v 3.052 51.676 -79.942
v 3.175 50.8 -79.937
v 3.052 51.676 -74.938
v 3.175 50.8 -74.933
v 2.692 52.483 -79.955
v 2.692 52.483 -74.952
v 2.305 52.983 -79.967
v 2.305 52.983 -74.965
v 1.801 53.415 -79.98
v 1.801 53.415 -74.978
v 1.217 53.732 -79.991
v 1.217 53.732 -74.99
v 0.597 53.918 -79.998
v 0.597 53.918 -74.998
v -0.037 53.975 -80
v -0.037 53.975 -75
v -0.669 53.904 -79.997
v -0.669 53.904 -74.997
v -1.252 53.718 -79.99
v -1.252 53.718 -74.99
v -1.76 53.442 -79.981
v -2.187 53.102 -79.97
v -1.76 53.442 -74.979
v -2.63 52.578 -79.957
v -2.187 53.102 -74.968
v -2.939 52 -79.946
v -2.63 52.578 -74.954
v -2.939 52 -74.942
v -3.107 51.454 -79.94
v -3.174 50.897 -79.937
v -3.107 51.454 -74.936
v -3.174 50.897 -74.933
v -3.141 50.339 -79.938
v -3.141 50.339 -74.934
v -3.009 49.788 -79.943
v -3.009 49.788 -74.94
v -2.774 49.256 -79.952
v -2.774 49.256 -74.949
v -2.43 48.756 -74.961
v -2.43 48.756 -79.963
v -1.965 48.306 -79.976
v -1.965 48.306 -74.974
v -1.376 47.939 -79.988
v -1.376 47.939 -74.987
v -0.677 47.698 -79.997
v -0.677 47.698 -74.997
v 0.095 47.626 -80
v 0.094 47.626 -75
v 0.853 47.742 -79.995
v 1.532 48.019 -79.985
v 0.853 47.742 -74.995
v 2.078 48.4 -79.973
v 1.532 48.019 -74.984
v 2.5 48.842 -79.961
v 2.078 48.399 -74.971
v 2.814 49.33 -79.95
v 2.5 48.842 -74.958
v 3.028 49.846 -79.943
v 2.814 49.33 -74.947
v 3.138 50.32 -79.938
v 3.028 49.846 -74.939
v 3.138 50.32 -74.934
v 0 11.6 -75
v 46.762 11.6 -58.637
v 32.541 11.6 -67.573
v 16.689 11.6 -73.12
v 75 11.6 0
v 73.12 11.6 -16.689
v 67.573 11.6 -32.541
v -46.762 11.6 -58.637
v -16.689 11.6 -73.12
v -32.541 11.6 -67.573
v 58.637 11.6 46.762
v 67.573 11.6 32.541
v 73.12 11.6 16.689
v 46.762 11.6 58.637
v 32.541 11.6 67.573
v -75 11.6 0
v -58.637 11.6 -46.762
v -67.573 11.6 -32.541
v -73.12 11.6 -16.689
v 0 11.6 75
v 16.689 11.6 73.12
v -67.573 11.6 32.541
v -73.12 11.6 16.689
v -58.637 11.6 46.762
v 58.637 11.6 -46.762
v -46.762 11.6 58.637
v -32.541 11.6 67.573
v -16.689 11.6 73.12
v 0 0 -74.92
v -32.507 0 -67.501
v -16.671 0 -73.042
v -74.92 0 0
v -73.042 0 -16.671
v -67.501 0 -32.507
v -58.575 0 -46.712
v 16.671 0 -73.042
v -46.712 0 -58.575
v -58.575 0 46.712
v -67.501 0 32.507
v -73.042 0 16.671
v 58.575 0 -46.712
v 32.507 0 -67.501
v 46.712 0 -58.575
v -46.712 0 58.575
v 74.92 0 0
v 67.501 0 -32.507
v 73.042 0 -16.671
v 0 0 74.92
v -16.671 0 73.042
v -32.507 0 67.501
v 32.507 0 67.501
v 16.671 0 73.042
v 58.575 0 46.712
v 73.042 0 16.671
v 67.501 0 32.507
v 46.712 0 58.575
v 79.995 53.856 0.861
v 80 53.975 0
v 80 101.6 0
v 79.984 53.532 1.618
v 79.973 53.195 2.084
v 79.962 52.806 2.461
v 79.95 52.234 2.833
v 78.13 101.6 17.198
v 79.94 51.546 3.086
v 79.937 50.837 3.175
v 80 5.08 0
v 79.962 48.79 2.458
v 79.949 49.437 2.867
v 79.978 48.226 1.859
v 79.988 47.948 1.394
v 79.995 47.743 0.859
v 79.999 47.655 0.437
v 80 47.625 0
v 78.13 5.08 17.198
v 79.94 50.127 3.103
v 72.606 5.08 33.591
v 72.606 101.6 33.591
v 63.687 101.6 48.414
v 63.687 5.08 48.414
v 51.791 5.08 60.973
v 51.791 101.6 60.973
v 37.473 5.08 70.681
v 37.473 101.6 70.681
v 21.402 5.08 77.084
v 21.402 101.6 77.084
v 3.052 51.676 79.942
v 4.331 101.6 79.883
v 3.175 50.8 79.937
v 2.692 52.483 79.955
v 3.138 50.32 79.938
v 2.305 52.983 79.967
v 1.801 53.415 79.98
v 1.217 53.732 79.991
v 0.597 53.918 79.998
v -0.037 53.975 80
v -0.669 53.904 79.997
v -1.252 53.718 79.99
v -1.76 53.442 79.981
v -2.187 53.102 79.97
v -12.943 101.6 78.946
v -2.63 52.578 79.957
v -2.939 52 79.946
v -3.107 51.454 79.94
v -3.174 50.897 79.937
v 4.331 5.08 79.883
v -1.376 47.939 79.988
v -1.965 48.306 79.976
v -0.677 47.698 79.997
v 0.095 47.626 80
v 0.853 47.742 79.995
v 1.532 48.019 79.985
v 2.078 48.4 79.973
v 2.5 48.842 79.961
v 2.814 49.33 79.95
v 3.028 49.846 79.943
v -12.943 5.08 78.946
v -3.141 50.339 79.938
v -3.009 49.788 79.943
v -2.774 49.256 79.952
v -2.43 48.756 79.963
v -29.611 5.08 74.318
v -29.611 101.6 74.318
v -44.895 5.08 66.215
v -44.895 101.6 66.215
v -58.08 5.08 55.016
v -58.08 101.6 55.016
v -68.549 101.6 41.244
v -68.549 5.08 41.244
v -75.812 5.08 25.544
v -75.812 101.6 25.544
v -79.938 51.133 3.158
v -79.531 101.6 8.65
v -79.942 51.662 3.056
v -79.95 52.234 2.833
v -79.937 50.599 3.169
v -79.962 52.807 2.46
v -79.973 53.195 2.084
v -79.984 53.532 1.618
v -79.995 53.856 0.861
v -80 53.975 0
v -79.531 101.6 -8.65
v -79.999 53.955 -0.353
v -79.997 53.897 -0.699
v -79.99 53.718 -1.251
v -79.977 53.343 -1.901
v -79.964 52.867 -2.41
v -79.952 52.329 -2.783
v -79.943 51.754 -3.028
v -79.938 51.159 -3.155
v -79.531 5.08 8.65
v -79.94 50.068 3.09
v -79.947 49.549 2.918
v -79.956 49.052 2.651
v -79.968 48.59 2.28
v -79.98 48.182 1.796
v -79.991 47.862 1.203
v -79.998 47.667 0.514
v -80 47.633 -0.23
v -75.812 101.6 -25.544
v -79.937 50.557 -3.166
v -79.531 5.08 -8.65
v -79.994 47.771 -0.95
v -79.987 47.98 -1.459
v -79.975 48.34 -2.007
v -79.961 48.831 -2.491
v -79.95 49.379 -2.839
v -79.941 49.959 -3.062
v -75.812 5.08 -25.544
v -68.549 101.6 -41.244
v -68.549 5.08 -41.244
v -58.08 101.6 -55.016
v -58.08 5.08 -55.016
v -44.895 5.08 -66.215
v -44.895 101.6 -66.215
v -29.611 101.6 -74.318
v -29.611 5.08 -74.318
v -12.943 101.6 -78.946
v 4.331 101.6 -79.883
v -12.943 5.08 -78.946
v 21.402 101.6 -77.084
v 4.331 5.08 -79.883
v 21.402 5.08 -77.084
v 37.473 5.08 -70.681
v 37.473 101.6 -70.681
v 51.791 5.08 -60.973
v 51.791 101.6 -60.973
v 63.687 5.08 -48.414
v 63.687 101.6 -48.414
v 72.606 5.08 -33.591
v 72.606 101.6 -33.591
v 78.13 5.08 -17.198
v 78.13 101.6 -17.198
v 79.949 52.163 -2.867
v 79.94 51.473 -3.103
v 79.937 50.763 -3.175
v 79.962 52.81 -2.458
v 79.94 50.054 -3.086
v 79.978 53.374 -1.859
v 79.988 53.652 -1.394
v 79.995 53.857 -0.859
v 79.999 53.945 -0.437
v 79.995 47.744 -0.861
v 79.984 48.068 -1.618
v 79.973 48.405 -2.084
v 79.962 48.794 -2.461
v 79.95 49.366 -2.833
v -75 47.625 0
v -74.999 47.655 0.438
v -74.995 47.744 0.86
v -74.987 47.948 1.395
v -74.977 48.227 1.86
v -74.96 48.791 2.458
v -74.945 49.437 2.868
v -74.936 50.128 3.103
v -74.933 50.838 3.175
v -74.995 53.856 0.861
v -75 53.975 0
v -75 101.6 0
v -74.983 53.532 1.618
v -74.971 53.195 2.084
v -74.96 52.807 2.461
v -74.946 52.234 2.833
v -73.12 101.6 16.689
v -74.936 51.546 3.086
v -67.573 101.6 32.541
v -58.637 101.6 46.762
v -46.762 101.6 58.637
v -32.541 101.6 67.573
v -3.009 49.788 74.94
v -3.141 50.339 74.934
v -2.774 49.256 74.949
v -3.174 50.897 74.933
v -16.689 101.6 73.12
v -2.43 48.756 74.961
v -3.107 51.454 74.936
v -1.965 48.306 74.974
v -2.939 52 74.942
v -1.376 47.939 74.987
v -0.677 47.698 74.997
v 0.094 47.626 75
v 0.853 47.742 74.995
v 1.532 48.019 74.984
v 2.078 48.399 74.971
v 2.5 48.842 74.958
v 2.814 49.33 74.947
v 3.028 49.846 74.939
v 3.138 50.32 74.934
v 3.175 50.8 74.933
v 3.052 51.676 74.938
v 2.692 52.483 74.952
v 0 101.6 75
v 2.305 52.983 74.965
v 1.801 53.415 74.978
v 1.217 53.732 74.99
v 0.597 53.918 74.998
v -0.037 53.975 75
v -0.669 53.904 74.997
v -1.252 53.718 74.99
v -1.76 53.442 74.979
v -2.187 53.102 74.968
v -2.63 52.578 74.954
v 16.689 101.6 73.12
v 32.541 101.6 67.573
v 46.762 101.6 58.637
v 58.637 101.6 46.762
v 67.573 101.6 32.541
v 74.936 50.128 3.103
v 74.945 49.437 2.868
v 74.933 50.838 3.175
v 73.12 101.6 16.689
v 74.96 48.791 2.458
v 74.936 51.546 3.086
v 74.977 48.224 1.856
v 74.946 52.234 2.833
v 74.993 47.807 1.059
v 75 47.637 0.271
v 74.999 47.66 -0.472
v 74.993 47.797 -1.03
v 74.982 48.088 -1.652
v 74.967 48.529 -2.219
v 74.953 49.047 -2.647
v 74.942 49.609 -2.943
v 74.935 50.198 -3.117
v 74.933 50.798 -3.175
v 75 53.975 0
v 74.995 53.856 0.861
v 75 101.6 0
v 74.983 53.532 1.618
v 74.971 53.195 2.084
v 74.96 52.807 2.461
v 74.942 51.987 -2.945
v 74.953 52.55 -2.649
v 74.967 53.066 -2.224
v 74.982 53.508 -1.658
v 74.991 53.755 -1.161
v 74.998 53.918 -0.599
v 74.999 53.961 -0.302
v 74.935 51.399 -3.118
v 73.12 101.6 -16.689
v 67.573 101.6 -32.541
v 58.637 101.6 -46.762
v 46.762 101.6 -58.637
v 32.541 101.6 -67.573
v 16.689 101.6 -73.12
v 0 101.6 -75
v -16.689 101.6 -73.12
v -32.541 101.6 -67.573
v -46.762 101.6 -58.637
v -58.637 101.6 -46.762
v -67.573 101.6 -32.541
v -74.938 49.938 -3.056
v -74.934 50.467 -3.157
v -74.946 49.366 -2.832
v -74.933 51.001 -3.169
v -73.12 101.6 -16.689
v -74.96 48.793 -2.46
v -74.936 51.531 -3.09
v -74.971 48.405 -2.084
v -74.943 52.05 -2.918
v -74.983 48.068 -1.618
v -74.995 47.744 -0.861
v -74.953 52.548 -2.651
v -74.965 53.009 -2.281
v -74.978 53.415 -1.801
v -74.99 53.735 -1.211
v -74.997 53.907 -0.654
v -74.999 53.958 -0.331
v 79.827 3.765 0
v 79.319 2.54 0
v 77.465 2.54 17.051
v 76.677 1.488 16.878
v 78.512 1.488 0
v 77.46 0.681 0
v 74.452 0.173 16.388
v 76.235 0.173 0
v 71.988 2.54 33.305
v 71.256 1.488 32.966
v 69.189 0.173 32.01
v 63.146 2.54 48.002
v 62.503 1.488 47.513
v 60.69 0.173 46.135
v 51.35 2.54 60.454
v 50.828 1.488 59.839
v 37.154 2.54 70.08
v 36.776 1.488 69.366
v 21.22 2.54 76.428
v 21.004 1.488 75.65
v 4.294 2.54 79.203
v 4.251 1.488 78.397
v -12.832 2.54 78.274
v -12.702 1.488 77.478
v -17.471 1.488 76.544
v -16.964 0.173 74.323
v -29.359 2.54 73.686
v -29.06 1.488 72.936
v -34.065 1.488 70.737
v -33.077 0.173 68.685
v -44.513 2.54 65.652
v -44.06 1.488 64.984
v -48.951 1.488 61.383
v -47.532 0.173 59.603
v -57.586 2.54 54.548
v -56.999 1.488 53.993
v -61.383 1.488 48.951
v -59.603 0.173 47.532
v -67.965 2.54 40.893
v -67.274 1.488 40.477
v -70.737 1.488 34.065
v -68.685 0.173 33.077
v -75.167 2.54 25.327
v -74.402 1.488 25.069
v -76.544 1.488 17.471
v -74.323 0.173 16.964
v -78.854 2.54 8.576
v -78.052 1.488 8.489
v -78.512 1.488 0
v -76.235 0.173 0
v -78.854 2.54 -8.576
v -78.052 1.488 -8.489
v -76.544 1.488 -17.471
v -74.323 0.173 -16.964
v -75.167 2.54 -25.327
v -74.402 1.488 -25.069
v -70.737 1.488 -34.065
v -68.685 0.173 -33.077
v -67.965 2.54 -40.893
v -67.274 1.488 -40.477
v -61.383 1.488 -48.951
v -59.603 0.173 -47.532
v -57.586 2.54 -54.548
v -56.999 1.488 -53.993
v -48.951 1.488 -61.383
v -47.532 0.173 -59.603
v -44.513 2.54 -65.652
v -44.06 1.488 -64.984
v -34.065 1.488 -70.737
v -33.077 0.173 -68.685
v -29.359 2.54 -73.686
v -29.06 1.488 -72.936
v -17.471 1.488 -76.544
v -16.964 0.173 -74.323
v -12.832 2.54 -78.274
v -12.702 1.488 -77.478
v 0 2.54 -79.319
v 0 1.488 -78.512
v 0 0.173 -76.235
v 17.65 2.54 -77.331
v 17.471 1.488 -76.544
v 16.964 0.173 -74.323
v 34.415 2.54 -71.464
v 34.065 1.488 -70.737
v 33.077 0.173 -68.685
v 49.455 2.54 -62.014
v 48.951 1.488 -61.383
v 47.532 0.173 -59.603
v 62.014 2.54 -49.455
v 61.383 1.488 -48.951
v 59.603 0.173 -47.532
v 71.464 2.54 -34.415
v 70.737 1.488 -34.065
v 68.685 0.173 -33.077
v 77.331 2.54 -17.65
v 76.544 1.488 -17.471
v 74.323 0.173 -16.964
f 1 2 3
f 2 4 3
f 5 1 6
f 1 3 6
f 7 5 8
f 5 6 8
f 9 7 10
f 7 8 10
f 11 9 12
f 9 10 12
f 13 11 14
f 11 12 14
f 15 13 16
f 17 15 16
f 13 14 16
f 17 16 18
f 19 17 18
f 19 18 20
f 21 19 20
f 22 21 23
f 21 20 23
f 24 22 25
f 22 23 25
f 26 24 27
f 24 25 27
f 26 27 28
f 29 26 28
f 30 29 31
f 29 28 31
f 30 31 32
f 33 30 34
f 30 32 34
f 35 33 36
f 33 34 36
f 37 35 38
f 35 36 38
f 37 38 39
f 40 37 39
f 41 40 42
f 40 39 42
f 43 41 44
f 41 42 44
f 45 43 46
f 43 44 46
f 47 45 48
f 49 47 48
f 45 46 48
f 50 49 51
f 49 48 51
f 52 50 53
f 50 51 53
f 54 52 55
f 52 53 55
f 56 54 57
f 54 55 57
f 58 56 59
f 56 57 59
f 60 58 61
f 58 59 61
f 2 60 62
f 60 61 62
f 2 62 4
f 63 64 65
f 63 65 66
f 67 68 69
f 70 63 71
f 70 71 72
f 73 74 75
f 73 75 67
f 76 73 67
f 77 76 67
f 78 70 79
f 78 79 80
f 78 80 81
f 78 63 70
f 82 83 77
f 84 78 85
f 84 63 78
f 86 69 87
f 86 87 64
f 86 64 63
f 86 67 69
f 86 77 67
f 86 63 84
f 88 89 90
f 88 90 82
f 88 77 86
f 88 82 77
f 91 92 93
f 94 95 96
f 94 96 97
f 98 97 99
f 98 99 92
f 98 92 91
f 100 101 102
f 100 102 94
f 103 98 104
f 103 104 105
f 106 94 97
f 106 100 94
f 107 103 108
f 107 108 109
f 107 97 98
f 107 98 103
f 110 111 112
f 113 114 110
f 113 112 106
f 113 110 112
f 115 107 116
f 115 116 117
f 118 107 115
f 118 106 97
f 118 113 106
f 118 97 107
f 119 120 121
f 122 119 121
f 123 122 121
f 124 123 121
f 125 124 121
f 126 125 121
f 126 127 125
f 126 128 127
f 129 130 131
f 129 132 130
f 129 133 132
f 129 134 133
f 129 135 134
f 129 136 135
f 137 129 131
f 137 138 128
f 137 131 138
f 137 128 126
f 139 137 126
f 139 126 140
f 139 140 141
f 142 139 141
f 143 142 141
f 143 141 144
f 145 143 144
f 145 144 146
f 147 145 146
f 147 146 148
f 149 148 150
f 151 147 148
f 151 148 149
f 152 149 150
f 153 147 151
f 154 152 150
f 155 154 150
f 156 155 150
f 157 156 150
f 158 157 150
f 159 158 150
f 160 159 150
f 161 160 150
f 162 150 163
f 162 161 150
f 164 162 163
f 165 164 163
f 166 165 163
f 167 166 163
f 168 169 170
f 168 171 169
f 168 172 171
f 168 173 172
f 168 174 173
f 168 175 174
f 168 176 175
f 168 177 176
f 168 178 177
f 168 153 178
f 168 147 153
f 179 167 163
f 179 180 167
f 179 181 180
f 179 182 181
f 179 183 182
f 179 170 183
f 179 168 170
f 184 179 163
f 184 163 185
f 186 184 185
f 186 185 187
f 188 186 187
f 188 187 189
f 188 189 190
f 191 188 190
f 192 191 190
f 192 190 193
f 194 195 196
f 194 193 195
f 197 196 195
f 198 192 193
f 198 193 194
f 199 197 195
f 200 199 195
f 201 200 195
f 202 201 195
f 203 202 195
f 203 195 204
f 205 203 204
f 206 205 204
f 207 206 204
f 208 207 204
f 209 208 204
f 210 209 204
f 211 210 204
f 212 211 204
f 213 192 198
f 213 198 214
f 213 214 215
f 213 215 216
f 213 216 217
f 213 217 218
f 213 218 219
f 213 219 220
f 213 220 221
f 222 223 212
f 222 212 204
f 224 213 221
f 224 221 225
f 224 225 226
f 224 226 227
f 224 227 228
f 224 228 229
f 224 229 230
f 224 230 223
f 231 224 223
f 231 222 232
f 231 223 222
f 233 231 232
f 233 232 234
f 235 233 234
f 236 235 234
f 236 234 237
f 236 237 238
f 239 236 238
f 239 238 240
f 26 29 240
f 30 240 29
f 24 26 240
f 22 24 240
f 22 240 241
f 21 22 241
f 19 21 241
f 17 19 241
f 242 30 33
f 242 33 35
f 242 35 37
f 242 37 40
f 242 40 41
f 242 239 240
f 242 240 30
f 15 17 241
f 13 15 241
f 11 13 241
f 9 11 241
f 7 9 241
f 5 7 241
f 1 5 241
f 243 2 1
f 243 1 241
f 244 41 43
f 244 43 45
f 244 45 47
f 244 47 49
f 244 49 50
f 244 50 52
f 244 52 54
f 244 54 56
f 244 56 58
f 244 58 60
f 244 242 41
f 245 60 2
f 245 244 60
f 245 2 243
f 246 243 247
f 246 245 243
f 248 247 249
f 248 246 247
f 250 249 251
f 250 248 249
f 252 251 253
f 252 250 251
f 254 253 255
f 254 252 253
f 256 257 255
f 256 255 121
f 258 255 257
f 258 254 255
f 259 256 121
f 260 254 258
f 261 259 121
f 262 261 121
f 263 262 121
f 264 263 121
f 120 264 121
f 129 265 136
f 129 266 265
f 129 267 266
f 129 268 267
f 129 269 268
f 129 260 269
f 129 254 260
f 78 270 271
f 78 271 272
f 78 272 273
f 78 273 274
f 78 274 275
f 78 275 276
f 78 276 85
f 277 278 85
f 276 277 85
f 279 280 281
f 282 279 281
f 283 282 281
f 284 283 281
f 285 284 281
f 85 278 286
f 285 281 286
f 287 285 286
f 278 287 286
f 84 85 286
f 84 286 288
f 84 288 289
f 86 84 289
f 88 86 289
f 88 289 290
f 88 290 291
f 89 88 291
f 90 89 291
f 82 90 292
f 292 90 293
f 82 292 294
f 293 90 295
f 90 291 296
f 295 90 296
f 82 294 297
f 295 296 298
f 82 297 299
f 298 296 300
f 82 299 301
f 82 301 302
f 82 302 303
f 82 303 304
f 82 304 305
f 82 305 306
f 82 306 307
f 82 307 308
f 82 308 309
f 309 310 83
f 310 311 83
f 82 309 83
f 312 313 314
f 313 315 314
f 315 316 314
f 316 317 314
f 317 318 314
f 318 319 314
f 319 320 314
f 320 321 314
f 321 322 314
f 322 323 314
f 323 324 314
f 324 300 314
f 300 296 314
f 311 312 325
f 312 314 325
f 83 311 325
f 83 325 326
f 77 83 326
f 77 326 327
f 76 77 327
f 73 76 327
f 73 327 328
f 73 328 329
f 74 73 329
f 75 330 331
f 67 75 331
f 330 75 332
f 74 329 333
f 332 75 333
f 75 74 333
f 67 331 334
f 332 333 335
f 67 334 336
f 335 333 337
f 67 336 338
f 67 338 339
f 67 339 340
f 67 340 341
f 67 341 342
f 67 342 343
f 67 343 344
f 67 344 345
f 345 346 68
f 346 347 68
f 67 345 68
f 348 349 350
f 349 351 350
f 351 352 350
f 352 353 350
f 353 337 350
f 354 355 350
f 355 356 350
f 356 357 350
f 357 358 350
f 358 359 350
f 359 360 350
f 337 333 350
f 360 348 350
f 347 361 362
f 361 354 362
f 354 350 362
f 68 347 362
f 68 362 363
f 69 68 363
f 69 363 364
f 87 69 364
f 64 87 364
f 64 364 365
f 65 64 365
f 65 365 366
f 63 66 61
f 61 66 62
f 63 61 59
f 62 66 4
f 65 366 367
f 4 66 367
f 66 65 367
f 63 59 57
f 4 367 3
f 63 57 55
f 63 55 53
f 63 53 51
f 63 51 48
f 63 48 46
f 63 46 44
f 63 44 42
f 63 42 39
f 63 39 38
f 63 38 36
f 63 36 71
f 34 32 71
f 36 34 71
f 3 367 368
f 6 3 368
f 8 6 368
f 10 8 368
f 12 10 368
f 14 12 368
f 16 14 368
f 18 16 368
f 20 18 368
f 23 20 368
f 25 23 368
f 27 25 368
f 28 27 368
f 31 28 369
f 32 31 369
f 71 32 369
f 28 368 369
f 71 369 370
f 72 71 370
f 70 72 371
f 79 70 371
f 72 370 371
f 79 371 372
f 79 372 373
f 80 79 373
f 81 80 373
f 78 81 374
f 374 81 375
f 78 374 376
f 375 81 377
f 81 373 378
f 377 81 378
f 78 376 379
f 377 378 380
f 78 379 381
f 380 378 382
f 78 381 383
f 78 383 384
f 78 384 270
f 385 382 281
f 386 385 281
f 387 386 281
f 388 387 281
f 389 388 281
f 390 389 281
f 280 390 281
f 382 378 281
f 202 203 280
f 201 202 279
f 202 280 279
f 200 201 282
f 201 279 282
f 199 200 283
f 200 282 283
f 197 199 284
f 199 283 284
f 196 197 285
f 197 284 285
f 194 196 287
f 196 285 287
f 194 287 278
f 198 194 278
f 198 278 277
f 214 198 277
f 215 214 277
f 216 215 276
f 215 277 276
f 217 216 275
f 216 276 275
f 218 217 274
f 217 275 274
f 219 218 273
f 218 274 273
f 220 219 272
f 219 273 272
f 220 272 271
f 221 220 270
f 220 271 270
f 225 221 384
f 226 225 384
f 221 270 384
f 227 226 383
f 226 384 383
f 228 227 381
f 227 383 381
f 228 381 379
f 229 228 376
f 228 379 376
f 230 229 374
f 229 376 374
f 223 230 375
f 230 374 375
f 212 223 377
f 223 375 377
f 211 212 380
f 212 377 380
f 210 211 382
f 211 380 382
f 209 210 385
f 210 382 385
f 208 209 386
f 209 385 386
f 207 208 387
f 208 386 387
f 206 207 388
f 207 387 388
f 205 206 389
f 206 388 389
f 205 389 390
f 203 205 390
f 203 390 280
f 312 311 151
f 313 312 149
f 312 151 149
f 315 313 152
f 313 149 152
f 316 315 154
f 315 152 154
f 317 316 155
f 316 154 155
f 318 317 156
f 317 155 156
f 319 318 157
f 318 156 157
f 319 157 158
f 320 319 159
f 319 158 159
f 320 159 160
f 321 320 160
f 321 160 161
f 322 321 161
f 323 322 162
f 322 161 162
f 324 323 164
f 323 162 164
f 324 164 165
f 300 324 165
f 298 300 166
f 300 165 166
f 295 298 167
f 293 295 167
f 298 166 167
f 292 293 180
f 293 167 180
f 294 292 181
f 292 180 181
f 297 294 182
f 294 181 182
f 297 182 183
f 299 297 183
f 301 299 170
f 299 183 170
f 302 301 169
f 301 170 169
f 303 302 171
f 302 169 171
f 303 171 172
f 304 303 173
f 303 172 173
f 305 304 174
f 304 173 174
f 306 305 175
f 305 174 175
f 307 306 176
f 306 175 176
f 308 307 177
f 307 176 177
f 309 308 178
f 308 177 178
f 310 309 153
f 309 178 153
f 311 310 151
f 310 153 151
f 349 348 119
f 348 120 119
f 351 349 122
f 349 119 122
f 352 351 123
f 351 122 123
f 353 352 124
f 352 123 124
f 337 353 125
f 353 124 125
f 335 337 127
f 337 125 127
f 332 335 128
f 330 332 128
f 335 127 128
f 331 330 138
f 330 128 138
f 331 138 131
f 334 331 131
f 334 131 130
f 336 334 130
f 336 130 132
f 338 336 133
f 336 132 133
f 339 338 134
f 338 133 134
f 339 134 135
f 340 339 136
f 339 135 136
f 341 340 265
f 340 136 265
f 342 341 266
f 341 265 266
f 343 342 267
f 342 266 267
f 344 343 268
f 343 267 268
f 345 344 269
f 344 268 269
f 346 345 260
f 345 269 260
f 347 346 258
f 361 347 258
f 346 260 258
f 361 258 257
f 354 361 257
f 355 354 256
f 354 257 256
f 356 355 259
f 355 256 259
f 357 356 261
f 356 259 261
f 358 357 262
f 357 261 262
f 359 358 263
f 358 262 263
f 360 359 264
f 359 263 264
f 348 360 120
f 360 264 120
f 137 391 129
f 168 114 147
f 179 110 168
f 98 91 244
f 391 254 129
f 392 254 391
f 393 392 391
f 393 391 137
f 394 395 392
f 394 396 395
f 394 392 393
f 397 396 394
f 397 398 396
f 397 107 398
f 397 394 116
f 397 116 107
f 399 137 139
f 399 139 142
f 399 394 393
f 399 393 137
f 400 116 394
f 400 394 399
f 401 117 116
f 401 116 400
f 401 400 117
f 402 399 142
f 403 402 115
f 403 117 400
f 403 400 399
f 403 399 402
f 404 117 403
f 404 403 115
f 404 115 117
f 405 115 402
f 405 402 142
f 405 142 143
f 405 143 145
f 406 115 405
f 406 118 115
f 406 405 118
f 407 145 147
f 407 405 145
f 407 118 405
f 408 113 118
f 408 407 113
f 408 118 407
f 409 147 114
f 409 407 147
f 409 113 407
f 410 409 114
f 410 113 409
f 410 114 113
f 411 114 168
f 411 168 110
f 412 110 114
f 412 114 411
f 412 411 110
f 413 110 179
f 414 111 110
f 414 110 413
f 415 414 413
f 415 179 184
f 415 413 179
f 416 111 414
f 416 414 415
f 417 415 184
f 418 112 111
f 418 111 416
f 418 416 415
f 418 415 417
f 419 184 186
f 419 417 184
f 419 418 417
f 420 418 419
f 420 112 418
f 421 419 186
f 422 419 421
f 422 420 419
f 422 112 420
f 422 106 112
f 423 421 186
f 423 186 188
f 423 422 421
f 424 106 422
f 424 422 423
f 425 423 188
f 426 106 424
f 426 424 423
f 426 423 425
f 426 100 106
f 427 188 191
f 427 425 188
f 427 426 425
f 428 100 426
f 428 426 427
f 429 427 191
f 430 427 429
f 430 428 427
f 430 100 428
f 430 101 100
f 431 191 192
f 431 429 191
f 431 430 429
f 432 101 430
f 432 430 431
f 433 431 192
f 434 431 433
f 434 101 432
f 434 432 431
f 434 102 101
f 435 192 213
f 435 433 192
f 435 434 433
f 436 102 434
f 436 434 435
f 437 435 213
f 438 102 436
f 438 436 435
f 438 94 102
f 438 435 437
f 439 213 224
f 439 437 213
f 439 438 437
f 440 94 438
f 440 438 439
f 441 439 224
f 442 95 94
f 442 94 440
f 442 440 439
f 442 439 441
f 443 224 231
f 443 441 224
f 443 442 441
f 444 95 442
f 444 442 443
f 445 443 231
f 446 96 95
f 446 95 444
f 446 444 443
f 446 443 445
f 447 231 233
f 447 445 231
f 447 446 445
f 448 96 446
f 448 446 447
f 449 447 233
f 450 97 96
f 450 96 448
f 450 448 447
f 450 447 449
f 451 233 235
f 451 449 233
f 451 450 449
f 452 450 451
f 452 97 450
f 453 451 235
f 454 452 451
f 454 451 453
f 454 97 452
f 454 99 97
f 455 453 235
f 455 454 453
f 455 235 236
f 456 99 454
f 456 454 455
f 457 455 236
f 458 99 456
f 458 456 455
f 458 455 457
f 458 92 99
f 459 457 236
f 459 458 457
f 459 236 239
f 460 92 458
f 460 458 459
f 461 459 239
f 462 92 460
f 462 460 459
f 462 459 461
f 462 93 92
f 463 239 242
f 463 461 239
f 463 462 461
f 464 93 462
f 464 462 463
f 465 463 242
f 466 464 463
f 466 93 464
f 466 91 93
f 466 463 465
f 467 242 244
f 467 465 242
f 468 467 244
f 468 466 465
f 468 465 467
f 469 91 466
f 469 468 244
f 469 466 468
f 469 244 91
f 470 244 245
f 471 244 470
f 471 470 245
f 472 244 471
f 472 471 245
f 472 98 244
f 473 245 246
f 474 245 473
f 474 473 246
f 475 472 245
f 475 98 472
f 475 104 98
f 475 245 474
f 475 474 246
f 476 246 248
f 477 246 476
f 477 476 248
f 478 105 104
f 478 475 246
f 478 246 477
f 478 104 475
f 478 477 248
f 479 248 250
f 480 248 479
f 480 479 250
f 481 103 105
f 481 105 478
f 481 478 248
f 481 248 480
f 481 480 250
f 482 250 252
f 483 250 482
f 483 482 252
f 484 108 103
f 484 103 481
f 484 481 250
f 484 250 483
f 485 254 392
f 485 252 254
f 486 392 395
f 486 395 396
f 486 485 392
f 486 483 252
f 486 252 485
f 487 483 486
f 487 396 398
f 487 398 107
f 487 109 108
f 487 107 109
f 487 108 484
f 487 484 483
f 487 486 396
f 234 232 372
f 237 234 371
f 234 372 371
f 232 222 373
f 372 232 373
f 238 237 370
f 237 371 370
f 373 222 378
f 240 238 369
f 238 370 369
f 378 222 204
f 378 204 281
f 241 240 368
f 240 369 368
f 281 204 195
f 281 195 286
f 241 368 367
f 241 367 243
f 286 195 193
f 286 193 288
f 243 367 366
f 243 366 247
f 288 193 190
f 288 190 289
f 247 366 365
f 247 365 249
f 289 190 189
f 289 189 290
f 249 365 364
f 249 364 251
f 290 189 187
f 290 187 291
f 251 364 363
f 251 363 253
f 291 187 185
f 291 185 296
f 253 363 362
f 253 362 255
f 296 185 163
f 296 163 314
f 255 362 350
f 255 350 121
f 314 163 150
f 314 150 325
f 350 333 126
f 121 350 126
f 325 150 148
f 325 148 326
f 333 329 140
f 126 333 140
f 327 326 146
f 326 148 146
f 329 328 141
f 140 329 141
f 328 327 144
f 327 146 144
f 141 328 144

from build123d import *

# Parameters (mm, degrees)
F0_R     = 80
F1_DEPTH = 101.6
F2_R     = 5.08
F3_R     = 75
F4_DEPTH = 90
F5_R     = 3.175
F6_DEPTH = 127
F7_R     = 3.175
F8_DEPTH = 127


with BuildPart() as f1:
    # F0 (on Front) → F1 (new body)
    with BuildSketch(Plane.XZ):
        Circle(F0_R)
    extrude(amount=-F1_DEPTH)

    # F2
    f2_edges = [f1.edges().sort_by_distance(p)[0] for p in [
        (-80, 0, 0),
    ]]
    fillet(f2_edges, radius=F2_R)

    # F3 (on face) → F4 (cut)
    with BuildSketch(Plane(origin=(0, 101.6, 0), x_dir=(-1, 0, 0), z_dir=(0, 1, 0))):
        Circle(F3_R)
    extrude(amount=-F4_DEPTH, mode=Mode.SUBTRACT)

    # F5 (on Top) → F6 (cut, symmetric)
    with BuildSketch(Plane.XY):
        with Locations((0, 50.8)):
            Circle(F5_R)
    extrude(amount=F6_DEPTH, both=True, mode=Mode.SUBTRACT)

    # F7 (on Right) → F8 (cut, symmetric)
    with BuildSketch(Plane.YZ):
        with Locations((50.8, 0)):
            Circle(F7_R)
    extrude(amount=F8_DEPTH, both=True, mode=Mode.SUBTRACT)


solid = f1.part
